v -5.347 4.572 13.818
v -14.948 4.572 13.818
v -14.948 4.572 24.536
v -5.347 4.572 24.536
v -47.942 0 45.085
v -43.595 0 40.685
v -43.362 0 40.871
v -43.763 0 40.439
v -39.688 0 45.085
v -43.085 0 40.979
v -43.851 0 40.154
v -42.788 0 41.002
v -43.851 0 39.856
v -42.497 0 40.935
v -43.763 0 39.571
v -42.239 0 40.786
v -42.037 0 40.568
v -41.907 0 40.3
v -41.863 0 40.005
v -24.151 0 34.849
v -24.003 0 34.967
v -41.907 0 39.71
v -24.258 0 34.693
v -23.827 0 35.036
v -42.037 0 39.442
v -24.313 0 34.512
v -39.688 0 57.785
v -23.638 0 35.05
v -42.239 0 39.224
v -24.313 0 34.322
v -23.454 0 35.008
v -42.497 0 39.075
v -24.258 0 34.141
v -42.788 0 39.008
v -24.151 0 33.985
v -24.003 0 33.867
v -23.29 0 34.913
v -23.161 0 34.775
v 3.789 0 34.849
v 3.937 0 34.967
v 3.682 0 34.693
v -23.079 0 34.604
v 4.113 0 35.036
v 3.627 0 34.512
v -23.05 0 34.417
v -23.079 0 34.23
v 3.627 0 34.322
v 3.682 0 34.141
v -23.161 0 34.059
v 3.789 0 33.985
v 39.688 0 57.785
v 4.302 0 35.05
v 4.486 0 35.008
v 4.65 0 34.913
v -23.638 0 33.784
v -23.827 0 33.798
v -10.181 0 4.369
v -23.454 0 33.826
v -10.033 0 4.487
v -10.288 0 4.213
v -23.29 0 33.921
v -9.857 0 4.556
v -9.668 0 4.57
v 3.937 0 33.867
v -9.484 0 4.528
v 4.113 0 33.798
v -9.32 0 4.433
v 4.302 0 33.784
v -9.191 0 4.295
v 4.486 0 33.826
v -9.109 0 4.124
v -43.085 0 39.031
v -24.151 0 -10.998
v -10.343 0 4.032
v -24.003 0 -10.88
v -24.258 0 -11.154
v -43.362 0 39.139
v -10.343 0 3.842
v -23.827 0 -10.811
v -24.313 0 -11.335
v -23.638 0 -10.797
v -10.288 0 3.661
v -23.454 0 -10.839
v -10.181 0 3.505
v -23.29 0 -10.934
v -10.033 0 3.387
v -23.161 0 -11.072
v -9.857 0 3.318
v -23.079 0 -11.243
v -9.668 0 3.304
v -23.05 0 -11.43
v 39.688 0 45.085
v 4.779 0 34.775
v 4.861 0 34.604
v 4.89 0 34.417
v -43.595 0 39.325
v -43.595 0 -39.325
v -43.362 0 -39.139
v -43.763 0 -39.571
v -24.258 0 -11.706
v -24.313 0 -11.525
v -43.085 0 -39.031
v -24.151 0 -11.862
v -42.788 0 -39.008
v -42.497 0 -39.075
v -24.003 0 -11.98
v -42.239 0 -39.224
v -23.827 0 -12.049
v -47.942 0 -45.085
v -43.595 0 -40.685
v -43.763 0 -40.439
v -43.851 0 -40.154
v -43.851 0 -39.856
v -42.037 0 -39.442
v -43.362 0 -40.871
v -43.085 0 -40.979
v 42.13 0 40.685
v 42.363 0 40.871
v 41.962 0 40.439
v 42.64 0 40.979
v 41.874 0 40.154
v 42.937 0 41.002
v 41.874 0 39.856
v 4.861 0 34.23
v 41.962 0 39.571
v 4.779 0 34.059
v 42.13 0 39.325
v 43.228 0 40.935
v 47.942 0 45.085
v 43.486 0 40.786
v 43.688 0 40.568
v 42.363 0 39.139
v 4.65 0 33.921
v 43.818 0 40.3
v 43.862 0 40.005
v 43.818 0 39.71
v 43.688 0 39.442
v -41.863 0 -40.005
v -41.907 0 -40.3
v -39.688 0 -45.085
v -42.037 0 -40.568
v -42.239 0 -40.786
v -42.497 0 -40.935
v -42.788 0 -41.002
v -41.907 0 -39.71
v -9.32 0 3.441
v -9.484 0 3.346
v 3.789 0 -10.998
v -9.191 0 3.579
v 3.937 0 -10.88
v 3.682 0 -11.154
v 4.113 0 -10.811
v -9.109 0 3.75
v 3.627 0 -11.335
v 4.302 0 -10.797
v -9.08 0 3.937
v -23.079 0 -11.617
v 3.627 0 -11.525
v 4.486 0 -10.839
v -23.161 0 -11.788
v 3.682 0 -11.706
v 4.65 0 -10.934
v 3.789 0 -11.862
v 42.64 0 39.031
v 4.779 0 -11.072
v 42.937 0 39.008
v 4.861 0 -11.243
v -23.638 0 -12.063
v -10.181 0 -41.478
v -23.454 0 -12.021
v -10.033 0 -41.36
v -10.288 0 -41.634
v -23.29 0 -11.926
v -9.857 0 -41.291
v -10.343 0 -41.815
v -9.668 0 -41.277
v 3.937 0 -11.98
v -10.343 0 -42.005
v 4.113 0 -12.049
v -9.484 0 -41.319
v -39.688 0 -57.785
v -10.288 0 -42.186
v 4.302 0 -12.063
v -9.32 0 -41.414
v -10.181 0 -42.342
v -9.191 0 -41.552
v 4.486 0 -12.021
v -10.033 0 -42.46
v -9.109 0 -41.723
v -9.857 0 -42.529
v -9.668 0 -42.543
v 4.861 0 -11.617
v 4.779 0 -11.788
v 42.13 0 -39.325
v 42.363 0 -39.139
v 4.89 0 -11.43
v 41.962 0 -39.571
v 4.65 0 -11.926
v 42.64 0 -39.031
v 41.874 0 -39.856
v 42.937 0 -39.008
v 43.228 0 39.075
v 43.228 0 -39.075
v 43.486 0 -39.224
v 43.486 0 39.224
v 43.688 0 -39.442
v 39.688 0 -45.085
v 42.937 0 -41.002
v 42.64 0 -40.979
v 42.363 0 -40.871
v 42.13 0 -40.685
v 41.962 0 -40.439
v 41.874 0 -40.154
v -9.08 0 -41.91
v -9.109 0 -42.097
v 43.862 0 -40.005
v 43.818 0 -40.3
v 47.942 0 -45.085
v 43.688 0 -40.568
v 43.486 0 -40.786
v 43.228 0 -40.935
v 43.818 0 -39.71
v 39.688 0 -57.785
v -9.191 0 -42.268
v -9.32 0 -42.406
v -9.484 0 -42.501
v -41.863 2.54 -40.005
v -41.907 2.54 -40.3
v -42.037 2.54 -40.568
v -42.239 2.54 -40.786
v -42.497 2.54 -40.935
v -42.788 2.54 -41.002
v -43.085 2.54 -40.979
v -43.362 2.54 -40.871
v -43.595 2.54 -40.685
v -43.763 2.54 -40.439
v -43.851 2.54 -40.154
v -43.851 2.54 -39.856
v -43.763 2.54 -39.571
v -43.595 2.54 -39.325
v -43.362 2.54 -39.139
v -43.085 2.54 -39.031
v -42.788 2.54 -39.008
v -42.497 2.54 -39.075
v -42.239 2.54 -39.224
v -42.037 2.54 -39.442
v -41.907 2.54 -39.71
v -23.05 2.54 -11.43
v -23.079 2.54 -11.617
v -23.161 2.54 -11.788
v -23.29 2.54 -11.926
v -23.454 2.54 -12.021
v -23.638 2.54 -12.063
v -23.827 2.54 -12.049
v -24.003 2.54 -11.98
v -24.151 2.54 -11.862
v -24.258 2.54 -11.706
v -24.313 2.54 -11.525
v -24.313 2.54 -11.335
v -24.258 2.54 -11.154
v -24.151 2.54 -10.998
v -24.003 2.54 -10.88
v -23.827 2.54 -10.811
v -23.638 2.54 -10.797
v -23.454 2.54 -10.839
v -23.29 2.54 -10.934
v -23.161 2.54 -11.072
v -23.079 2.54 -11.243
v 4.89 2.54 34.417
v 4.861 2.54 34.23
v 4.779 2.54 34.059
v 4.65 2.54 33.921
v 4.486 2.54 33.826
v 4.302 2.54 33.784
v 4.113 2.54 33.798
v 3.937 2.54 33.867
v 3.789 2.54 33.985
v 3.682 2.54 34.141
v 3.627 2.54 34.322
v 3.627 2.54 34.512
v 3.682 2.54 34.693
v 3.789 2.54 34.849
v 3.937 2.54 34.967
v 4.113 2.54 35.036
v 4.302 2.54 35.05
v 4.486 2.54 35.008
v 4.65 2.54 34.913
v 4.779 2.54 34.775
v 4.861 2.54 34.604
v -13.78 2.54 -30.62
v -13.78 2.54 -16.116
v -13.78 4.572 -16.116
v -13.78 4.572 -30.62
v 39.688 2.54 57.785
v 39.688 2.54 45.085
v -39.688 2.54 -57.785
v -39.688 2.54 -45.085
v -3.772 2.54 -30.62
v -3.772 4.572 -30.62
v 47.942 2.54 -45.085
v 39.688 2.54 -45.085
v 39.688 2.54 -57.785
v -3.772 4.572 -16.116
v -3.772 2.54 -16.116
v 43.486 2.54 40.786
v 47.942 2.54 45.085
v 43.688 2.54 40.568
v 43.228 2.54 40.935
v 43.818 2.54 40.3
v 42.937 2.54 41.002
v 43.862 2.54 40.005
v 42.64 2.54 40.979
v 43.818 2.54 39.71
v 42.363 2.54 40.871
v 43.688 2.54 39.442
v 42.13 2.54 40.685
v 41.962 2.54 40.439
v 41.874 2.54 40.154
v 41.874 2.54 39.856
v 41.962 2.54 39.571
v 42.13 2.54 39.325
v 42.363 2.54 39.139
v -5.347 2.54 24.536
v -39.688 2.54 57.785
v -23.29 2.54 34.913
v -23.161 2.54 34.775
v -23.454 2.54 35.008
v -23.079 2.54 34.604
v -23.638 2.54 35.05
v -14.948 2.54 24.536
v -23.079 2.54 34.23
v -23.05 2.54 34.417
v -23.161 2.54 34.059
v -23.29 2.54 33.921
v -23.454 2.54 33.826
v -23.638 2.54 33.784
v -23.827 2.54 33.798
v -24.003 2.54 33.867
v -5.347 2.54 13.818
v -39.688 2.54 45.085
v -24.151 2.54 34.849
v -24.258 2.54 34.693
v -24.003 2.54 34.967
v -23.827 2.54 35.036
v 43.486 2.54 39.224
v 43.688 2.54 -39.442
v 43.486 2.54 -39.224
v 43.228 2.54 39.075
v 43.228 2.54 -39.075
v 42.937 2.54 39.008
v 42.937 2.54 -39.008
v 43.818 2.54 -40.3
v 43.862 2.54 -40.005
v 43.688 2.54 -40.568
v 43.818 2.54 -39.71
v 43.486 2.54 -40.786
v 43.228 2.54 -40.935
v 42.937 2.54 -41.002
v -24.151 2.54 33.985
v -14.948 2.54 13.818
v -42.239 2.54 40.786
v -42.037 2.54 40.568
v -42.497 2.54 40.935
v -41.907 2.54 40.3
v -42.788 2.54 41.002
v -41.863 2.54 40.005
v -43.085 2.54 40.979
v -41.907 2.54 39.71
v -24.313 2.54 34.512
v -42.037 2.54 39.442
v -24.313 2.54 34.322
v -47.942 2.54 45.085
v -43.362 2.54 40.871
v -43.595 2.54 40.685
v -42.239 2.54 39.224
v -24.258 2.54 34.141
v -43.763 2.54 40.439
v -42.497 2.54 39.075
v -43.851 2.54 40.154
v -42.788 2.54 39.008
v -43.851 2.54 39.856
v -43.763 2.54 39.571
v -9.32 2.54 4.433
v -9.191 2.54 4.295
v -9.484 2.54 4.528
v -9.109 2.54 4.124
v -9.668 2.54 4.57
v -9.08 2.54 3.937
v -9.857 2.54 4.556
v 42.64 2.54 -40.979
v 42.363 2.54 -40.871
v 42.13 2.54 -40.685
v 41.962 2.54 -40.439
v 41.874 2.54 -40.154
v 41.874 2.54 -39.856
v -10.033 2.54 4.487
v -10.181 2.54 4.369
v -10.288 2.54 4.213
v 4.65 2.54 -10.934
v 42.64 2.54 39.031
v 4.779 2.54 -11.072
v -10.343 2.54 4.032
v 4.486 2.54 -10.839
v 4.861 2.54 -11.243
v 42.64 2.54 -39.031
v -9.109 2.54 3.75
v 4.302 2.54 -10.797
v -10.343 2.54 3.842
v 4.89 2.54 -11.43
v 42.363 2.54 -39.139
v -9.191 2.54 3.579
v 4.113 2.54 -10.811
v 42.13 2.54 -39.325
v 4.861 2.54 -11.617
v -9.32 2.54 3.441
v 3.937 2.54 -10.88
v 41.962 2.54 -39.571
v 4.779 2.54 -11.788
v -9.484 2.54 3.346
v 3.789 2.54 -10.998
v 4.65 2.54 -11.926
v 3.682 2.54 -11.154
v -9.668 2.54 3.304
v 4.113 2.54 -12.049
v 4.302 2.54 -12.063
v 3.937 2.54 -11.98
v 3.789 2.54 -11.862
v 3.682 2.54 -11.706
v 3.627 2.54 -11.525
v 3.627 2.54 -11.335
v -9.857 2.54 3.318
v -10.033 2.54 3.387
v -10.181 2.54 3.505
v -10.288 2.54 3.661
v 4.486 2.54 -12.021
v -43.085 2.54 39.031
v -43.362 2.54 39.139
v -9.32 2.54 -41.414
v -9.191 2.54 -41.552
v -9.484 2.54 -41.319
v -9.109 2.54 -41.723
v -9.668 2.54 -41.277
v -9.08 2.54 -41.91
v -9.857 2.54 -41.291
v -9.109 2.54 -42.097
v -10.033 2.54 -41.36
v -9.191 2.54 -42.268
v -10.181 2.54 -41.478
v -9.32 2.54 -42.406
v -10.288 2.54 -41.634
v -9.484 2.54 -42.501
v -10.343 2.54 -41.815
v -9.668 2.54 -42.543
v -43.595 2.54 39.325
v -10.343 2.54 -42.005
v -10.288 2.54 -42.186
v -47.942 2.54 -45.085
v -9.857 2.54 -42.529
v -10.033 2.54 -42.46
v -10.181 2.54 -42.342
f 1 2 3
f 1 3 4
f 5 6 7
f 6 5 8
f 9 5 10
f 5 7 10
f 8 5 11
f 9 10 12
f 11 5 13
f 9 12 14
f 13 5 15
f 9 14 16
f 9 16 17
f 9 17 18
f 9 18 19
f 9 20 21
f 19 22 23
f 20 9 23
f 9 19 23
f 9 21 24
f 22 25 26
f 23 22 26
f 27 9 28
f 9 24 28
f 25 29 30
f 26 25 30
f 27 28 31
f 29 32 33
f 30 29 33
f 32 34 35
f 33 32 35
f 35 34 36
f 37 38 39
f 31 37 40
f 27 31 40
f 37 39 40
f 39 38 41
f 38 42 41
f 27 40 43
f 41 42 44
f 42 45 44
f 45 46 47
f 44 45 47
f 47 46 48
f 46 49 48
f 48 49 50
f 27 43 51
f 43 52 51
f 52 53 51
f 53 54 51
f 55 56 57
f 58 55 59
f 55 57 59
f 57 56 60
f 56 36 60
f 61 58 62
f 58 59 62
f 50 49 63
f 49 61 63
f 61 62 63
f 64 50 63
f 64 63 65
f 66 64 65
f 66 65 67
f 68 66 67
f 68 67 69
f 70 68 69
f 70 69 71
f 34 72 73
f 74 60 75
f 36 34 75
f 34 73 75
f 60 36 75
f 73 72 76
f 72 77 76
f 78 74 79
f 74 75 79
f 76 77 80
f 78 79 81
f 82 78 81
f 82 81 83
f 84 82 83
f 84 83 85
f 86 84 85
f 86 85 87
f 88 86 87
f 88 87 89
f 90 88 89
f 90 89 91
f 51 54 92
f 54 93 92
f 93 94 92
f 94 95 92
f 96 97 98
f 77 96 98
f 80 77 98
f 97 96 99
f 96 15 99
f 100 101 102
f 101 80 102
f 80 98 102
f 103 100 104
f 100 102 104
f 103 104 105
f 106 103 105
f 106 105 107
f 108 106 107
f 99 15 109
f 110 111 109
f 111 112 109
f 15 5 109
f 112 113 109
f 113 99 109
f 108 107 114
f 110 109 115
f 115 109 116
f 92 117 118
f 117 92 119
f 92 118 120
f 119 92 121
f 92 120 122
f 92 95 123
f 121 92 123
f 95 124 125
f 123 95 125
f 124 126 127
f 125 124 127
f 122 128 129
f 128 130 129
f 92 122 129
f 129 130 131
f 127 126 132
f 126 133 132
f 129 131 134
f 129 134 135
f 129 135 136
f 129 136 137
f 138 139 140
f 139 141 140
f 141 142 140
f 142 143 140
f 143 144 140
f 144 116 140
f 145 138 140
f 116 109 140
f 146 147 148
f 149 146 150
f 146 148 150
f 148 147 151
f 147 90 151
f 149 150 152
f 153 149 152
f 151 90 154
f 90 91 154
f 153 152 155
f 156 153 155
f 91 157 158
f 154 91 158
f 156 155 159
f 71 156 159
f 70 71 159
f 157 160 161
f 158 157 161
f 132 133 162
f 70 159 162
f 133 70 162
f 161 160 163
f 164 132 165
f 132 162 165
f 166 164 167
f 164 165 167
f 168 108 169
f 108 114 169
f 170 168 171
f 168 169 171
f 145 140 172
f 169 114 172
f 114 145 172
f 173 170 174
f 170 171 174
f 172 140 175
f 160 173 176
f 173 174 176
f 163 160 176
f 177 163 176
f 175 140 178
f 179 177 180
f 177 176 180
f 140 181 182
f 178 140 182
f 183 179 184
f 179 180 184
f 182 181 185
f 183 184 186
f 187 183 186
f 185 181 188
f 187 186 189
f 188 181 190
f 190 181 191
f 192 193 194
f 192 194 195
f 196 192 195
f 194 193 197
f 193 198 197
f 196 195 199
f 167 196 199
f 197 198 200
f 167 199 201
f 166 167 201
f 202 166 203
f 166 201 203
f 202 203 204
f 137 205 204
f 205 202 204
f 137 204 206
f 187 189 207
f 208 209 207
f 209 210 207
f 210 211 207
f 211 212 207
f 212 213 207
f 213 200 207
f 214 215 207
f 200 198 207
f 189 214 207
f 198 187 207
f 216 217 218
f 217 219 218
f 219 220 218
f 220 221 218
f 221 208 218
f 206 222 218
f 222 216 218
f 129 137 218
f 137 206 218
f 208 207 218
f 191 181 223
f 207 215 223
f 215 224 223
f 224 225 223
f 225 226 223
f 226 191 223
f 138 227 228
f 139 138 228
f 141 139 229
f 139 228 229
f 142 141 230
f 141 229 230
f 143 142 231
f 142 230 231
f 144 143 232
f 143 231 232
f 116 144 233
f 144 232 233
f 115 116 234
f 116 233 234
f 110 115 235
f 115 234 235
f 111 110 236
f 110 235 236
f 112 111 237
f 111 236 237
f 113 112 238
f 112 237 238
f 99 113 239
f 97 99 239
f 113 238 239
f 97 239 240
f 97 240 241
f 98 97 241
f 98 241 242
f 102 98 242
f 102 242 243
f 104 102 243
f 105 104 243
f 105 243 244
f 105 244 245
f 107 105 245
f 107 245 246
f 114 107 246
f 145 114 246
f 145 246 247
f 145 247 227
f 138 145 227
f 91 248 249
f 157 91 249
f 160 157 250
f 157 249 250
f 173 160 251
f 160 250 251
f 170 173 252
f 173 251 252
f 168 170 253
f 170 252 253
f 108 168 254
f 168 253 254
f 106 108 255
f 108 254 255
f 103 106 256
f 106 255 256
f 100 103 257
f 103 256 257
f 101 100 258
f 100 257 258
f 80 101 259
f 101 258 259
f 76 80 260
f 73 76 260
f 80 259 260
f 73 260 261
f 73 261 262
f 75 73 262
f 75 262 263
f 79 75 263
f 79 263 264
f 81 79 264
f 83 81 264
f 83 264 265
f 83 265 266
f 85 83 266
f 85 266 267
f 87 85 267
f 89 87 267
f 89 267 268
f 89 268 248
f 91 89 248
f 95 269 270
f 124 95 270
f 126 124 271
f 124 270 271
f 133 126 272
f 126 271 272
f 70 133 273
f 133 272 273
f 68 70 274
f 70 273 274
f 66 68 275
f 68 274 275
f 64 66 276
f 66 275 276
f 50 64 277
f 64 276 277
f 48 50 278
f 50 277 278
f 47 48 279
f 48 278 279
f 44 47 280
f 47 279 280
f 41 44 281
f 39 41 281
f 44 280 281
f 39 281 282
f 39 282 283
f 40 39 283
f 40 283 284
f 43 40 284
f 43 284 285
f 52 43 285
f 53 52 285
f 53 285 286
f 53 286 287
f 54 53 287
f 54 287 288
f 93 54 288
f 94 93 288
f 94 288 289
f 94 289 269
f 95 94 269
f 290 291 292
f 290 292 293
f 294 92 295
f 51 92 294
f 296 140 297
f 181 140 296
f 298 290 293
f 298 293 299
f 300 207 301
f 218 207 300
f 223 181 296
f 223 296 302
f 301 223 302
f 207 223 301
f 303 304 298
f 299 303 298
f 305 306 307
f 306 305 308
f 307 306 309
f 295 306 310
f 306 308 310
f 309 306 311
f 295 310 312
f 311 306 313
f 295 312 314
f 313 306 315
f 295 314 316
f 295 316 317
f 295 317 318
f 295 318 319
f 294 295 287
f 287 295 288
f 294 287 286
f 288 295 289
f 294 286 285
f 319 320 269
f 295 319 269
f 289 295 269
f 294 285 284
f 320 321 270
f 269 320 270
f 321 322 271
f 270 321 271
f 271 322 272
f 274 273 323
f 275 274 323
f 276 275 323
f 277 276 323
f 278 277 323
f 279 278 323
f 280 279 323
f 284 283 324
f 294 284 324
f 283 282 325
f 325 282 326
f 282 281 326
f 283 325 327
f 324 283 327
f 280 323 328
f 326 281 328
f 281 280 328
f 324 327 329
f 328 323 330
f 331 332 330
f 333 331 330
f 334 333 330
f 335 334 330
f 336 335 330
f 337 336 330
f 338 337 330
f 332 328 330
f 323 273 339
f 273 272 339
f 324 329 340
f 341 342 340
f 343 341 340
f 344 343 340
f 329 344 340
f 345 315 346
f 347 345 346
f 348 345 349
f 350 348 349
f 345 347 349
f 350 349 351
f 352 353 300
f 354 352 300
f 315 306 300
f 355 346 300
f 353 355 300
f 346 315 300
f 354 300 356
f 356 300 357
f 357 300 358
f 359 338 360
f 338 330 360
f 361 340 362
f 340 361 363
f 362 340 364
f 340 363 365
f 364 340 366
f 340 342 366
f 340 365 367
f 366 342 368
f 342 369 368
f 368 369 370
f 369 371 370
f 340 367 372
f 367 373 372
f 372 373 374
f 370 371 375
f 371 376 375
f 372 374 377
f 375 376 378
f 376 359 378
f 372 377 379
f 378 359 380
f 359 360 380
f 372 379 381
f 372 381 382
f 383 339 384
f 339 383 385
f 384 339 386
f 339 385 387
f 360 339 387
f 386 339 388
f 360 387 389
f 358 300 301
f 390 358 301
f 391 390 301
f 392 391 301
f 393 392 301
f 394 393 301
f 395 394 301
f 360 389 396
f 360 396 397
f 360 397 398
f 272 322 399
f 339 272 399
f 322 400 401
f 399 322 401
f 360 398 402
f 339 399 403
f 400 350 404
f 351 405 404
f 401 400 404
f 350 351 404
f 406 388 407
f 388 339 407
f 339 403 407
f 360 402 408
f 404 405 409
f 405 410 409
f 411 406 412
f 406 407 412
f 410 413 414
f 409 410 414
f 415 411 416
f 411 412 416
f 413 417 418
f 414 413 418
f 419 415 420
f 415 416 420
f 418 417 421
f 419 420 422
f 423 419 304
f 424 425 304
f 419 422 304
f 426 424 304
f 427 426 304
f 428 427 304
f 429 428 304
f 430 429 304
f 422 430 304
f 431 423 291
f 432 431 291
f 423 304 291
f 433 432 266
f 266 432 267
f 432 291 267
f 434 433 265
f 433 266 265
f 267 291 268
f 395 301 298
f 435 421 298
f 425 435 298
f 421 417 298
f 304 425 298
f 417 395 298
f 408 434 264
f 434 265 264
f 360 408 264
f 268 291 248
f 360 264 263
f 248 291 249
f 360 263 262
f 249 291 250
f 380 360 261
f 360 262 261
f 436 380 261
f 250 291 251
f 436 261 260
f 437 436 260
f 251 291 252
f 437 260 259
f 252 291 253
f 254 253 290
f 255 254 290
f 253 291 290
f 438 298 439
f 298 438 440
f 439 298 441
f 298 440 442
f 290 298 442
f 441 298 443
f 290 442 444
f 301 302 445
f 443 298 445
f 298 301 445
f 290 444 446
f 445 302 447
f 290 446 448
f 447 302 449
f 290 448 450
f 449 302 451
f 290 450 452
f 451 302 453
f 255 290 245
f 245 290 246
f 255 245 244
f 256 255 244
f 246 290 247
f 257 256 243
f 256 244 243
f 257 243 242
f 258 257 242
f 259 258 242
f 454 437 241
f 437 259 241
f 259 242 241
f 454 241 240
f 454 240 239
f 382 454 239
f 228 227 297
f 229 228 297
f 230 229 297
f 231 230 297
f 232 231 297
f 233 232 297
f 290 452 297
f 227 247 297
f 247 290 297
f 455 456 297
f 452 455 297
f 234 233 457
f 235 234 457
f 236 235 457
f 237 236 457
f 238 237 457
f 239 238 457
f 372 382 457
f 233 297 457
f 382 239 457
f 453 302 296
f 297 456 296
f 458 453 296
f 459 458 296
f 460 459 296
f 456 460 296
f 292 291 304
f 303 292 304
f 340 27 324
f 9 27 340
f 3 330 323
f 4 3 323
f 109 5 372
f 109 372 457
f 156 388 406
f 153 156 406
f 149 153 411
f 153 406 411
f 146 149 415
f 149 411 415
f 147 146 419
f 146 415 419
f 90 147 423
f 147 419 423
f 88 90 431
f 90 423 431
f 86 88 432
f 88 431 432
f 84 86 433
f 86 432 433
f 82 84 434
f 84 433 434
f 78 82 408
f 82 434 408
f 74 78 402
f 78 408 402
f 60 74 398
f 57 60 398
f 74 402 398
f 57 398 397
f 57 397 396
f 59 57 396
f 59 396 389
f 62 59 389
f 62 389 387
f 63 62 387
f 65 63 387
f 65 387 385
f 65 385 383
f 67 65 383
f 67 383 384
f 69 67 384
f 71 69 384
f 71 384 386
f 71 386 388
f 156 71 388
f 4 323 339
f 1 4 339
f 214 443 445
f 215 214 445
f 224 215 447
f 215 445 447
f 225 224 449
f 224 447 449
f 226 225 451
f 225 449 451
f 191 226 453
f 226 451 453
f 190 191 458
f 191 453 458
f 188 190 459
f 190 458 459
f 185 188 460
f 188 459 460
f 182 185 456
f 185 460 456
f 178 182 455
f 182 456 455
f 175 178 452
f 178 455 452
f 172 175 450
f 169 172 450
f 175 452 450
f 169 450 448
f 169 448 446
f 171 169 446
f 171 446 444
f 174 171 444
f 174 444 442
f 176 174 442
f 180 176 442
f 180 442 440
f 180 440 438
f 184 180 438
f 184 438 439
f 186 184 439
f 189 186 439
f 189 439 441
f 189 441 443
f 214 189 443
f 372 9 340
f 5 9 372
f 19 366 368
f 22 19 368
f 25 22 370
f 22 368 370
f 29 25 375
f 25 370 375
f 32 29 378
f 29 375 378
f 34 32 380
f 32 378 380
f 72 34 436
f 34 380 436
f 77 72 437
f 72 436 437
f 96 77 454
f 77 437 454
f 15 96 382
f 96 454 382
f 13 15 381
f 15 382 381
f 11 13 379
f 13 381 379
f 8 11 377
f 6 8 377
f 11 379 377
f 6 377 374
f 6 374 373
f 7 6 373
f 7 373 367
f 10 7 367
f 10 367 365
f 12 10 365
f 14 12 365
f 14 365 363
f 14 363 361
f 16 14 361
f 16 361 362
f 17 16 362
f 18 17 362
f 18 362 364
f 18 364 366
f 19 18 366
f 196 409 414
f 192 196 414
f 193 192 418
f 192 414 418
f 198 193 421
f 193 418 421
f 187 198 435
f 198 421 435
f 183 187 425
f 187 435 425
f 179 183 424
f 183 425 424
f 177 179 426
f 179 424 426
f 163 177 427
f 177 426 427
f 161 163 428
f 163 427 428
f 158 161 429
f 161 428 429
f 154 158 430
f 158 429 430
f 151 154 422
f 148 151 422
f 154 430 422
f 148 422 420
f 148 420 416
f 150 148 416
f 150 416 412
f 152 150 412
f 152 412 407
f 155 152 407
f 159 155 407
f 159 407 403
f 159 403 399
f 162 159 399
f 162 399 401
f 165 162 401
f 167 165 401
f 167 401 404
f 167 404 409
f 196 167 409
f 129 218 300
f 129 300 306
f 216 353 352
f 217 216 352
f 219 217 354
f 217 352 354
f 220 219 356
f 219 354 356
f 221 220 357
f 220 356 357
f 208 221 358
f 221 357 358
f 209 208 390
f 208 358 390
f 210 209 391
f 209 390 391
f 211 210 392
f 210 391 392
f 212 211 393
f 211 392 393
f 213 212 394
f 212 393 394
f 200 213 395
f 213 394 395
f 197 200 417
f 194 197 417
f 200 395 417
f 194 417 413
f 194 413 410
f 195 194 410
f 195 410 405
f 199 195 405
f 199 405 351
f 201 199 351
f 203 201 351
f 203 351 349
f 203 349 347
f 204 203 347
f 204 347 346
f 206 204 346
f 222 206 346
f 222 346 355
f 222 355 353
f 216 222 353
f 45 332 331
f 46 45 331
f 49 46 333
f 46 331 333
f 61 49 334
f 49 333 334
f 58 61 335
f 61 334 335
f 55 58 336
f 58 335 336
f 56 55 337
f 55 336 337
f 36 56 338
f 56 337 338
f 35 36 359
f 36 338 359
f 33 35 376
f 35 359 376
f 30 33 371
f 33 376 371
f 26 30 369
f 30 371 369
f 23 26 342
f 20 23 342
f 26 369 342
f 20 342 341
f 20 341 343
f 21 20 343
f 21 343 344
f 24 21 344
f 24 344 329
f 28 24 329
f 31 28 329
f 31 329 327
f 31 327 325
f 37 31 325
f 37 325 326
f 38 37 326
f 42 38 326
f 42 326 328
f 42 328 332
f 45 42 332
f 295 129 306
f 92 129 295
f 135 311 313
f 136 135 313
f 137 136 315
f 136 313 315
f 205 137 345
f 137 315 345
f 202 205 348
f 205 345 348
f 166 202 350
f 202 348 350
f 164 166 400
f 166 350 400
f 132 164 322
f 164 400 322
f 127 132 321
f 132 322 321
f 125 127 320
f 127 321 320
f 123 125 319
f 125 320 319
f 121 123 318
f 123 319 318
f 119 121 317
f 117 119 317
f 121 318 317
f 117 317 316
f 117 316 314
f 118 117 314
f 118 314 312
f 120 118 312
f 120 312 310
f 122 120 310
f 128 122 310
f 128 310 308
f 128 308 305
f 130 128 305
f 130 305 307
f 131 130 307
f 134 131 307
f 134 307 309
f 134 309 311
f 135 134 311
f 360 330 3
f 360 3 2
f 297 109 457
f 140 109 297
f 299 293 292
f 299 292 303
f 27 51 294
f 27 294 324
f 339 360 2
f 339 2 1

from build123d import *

# Parameters (mm, degrees)
BOSS_EXTRUDE1_DEPTH = 2.54
SKETCH3_W           = 9.6012
SKETCH3_H           = 10.7188
SKETCH3_W_2         = 10.0076
SKETCH3_H_2         = 14.5034
BOSS_EXTRUDE2_DEPTH = 4.572
SKETCH4_R           = 0.635
CUT_EXTRUDE1_DEPTH  = 3.54
SKETCH5_R           = 0.99949
CUT_EXTRUDE2_DEPTH  = 3.54


with BuildPart() as part:
    # Sketch1 → Boss-Extrude1 (new body)
    with BuildSketch(Plane(origin=(0, 0, 0), x_dir=(1, 0, 0), z_dir=(0, 1, 0))):
        Polygon((-47.9425, 45.085), (-39.6875, 45.085), (-39.6875, 57.785), (39.6875, 57.785), (39.6875, 45.085), (47.9425, 45.085), (47.9425, -45.085), (39.6875, -45.085), (39.6875, -57.785), (-39.6875, -57.785), (-39.6875, -45.085), (-47.9425, -45.085), align=None)
    extrude(amount=BOSS_EXTRUDE1_DEPTH)

    # Sketch3 → Boss-Extrude2 (add)
    with BuildSketch(Plane(origin=(0, 0, 0), x_dir=(1, 0, 0), z_dir=(0, 1, 0))):
        with Locations((-10.1473, -19.177)):
            Rectangle(SKETCH3_W, SKETCH3_H)
        with Locations((-8.7757, 23.368)):
            Rectangle(SKETCH3_W_2, SKETCH3_H_2)
    extrude(amount=BOSS_EXTRUDE2_DEPTH)

    # Sketch4 → Cut-Extrude1 (cut, through all)
    with BuildSketch(Plane(origin=(0, 2.54, 0), x_dir=(1, 0, 0), z_dir=(0, 1, 0))):
        with Locations((4.2545, -34.417)):
            Circle(SKETCH4_R)
        with Locations((-23.6855, -34.417)):
            Circle(SKETCH4_R)
        with Locations((-9.7155, -3.937)):
            Circle(SKETCH4_R)
        with Locations((4.2545, 11.43)):
            Circle(SKETCH4_R)
        with Locations((-23.6855, 11.43)):
            Circle(SKETCH4_R)
        with Locations((-9.7155, 41.91)):
            Circle(SKETCH4_R)
    extrude(amount=-CUT_EXTRUDE1_DEPTH, mode=Mode.SUBTRACT)

    # Sketch5 → Cut-Extrude2 (cut, through all)
    with BuildSketch(Plane(origin=(0, 2.54, 0), x_dir=(1, 0, 0), z_dir=(0, 1, 0))):
        with Locations((42.8625, -40.005)):
            Circle(SKETCH5_R)
        with Locations((42.8625, 40.005)):
            Circle(SKETCH5_R)
        with Locations((-42.8625, -40.005)):
            Circle(SKETCH5_R)
        with Locations((-42.8625, 40.005)):
            Circle(SKETCH5_R)
    extrude(amount=-CUT_EXTRUDE2_DEPTH, mode=Mode.SUBTRACT)


solid = part.part
